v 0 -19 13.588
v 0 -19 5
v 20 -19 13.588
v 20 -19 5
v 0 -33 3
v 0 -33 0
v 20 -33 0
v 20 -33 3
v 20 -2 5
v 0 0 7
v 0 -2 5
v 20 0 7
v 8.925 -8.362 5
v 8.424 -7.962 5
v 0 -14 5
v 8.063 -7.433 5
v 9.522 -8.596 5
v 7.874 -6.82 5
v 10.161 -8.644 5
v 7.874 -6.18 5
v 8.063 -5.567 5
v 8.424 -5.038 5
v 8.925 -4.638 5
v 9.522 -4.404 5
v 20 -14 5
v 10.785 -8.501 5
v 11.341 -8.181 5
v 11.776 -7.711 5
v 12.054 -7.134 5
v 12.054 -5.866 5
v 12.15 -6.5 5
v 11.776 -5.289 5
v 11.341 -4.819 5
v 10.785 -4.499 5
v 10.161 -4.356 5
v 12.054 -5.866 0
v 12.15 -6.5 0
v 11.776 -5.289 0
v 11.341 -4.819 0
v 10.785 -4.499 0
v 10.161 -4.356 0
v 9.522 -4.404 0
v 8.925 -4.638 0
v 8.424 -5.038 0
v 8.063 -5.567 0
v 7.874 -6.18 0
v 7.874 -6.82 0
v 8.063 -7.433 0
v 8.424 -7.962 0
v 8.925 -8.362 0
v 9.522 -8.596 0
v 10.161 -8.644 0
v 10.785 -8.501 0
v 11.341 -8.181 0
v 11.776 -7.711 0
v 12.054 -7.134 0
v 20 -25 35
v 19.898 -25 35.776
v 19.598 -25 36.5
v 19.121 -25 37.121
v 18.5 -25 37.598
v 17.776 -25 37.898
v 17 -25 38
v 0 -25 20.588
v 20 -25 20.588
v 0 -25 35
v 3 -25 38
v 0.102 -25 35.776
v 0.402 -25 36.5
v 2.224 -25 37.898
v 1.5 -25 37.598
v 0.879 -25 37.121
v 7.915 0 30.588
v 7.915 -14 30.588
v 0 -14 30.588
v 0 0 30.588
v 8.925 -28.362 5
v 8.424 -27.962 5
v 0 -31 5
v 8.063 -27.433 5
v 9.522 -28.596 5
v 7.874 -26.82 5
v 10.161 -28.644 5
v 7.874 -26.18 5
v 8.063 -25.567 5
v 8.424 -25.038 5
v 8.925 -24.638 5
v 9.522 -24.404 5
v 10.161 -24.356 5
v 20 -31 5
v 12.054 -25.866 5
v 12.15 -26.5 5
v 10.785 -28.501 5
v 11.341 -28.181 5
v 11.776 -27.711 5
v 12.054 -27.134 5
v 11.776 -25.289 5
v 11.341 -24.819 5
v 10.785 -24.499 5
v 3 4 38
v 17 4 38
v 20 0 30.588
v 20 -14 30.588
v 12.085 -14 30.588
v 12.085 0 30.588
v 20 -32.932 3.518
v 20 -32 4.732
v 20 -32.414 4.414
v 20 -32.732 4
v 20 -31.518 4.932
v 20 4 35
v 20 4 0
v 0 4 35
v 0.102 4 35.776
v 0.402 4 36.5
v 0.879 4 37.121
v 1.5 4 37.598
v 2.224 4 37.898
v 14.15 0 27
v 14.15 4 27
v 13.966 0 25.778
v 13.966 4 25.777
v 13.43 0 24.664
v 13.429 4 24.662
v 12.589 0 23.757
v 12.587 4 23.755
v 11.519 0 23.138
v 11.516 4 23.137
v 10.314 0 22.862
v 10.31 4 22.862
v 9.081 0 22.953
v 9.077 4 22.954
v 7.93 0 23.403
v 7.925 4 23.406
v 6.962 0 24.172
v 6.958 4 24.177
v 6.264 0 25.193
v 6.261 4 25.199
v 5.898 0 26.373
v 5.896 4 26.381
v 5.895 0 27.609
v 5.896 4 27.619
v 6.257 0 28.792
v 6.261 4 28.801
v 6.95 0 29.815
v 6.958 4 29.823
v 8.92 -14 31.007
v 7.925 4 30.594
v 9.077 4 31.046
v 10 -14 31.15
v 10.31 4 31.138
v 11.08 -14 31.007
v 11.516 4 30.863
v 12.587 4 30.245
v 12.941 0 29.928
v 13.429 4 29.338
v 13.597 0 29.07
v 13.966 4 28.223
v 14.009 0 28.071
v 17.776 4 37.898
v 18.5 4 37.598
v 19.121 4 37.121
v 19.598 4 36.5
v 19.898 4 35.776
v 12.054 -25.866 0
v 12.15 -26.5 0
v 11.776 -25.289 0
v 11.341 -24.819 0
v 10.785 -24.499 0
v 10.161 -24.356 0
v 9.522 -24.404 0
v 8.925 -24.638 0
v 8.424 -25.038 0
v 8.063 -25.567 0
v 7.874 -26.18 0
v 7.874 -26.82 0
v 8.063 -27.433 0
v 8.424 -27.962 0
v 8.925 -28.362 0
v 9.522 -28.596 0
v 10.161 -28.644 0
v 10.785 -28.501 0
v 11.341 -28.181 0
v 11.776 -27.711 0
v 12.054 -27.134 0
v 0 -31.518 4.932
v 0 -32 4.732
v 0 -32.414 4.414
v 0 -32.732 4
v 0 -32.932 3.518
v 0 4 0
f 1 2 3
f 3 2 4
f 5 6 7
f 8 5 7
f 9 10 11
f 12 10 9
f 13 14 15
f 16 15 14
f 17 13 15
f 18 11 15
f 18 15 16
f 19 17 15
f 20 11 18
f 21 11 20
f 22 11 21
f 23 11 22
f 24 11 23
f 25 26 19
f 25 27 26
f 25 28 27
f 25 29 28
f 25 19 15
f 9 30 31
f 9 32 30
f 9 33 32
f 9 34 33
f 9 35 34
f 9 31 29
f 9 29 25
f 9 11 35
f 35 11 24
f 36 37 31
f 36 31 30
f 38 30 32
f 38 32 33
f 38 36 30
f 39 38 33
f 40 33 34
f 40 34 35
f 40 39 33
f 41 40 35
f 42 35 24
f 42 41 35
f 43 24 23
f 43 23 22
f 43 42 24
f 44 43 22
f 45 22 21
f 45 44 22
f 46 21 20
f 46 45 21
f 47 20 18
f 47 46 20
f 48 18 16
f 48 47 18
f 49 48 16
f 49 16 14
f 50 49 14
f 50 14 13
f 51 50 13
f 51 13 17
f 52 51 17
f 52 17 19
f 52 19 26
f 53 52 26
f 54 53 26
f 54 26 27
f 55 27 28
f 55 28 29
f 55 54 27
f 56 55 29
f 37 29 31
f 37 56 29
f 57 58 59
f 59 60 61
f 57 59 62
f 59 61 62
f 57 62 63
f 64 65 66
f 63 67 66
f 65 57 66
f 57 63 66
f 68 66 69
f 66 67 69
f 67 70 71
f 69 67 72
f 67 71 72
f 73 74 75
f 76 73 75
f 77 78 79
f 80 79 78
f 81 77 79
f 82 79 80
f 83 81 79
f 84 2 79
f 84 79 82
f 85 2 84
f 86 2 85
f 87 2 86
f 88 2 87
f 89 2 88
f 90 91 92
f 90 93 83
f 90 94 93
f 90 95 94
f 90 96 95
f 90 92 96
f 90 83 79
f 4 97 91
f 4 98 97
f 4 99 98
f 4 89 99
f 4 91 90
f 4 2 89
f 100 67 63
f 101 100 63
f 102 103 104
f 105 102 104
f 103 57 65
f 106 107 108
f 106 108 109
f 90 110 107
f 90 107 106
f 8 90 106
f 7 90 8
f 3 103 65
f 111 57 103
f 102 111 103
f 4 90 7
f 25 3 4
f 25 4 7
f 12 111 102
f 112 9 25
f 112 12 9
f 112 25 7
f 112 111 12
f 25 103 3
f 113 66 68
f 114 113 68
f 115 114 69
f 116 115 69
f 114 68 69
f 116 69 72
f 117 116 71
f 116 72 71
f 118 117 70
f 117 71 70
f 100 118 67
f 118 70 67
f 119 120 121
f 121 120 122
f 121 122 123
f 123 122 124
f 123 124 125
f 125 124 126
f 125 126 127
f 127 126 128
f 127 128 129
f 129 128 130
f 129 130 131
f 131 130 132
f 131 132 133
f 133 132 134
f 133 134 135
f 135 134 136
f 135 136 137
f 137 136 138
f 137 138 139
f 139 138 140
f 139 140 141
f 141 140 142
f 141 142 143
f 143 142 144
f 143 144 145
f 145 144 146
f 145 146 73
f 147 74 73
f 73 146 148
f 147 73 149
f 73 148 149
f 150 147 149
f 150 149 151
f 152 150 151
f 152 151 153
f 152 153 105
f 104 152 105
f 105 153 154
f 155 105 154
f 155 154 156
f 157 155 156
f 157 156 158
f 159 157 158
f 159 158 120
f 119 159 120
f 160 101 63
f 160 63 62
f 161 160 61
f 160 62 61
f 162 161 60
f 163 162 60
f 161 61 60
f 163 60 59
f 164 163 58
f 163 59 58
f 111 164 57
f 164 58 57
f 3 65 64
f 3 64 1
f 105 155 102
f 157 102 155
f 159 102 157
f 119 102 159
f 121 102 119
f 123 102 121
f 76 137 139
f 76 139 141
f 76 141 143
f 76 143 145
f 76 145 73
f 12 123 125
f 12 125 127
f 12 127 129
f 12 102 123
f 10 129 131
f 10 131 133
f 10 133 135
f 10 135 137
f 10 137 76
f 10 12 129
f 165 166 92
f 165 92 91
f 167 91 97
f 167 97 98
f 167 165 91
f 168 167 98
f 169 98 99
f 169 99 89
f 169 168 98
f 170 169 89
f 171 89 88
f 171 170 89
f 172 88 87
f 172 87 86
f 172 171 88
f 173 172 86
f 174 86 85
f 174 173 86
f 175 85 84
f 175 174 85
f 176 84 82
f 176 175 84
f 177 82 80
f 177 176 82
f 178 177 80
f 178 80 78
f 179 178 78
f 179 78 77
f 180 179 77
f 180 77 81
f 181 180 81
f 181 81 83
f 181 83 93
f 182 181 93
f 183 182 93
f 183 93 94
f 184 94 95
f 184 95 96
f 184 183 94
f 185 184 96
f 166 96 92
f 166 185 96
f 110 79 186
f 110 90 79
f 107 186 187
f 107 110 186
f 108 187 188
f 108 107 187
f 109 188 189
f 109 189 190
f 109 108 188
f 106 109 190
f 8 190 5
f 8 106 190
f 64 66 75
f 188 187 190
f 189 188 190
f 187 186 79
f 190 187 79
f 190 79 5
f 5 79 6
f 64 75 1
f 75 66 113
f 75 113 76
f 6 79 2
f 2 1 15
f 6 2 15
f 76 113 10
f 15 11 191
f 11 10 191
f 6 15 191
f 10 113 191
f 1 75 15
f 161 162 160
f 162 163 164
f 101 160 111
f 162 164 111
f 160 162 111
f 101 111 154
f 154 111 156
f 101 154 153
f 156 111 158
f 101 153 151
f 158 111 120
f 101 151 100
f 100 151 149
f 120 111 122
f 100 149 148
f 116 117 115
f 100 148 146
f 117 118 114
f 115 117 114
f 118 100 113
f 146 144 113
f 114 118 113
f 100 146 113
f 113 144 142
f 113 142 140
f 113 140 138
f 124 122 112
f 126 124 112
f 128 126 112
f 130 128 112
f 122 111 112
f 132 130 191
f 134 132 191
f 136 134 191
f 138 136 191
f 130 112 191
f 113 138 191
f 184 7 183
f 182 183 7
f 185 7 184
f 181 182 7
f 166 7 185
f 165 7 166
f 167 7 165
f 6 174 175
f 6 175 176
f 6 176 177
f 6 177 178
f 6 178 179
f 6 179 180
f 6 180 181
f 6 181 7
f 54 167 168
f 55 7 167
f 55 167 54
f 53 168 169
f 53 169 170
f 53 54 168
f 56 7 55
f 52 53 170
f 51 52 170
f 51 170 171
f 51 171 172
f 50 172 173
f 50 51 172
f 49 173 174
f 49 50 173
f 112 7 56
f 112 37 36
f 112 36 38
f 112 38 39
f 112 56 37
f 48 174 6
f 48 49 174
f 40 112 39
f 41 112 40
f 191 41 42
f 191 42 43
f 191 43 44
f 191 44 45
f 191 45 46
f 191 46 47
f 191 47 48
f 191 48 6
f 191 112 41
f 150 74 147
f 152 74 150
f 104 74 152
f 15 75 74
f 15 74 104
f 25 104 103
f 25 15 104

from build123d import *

# Parameters (mm, degrees)
SKETCH1_W           = 20
SKETCH1_H           = 33
SKETCH1_R           = 2.15
BOSS_EXTRUDE1_DEPTH = 5
SKETCH2_W           = 20
SKETCH2_H           = 4
BOSS_EXTRUDE2_DEPTH = 38
SKETCH4_W           = 20
SKETCH4_H           = 7.411842069
BOSS_EXTRUDE3_DEPTH = 25
FILLET1_R           = 3
FILLET2_R           = 2
CHAMFER2_SIZE       = 2
SKETCH8_W           = 20
SKETCH8_H           = 5
BOSS_EXTRUDE5_DEPTH = 25.588158
SKETCH12_W          = 20
SKETCH12_H          = 10
BOSS_EXTRUDE6_DEPTH = 14
SKETCH3_R           = 4.15
CUT_EXTRUDE2_DEPTH  = 18
SKETCH15_W          = 20
SKETCH15_H          = 6
BOSS_EXTRUDE7_DEPTH = 10
SKETCH16_W          = 20
SKETCH16_H          = 14
CUT_EXTRUDE4_DEPTH  = 10
BOSS_EXTRUDE8_DEPTH = 20


with BuildPart() as part:
    # Sketch1 → Boss-Extrude1 (new body)
    with BuildSketch(Plane.XY):
        with Locations((10, -16.5)):
            Rectangle(SKETCH1_W, SKETCH1_H)
        with Locations((10, -6.5)):
            Circle(SKETCH1_R, mode=Mode.SUBTRACT)
        with Locations((10, -26.5)):
            Circle(SKETCH1_R, mode=Mode.SUBTRACT)
    extrude(amount=BOSS_EXTRUDE1_DEPTH)

    # Sketch2 → Boss-Extrude2 (add)
    with BuildSketch(Plane(origin=(0, 0, 0), x_dir=(-1, 0, 0), z_dir=(0, 0, -1))):
        with Locations((-10, 2)):
            Rectangle(SKETCH2_W, SKETCH2_H)
    extrude(amount=-BOSS_EXTRUDE2_DEPTH)

    # Sketch4 → Boss-Extrude3 (add)
    with BuildSketch(Plane.XZ):
        with Locations((10, 34.294078965)):
            Rectangle(SKETCH4_W, SKETCH4_H)
    extrude(amount=BOSS_EXTRUDE3_DEPTH)

    # Fillet1
    fillet1_edges = [part.edges().sort_by_distance(p)[0] for p in [
        (20, -10.5, 38),
        (0, -10.5, 38),
    ]]
    fillet(fillet1_edges, radius=FILLET1_R)

    # Fillet2
    fillet2_edges = [part.edges().sort_by_distance(p)[0] for p in [
        (10, -33, 5),
    ]]
    fillet(fillet2_edges, radius=FILLET2_R)

    # Chamfer2
    chamfer2_edges = [part.edges().sort_by_distance(p)[0] for p in [
        (10, 0, 5),
    ]]
    chamfer(chamfer2_edges, length=CHAMFER2_SIZE)

    # Sketch8 → Boss-Extrude5 (add)
    with BuildSketch(Plane.XY.offset(5)):
        with Locations((10, -16.5)):
            Rectangle(SKETCH8_W, SKETCH8_H)
    extrude(amount=BOSS_EXTRUDE5_DEPTH)

    # Sketch12 → Boss-Extrude6 (add)
    with BuildSketch(Plane(origin=(0, -14, 0), x_dir=(1, 0, 0), z_dir=(0, 1, 0))):
        with Locations((10, -25.588157931)):
            Rectangle(SKETCH12_W, SKETCH12_H)
    extrude(amount=BOSS_EXTRUDE6_DEPTH)

    # Sketch3 → Cut-Extrude2 (cut)
    with BuildSketch(Plane(origin=(0, 4, 0), x_dir=(1, 0, 0), z_dir=(0, 1, 0))):
        with Locations((10, -27)):
            Circle(SKETCH3_R)
    extrude(amount=-CUT_EXTRUDE2_DEPTH, mode=Mode.SUBTRACT)

    # Sketch15 → Boss-Extrude7 (add)
    with BuildSketch(Plane(origin=(0, 0, 30.588157931), x_dir=(-1, 0, 0), z_dir=(0, 0, -1))):
        with Locations((-10, -22)):
            Rectangle(SKETCH15_W, SKETCH15_H)
    extrude(amount=BOSS_EXTRUDE7_DEPTH)

    # Sketch16 → Cut-Extrude4 (cut)
    with BuildSketch(Plane(origin=(0, 0, 20.588157931), x_dir=(-1, 0, 0), z_dir=(0, 0, -1))):
        with Locations((-10, -7)):
            Rectangle(SKETCH16_W, SKETCH16_H)
    extrude(amount=-CUT_EXTRUDE4_DEPTH, mode=Mode.SUBTRACT)

    # Sketch17 → Boss-Extrude8 (add)
    with BuildSketch(Plane(origin=(20, 0, 0), x_dir=(0, 0, -1), z_dir=(1, 0, 0))):
        Polygon((-20.588157931, -19), (-20.588157931, -25), (-13.588157931, -19), align=None)
    extrude(amount=-BOSS_EXTRUDE8_DEPTH)


solid = part.part
